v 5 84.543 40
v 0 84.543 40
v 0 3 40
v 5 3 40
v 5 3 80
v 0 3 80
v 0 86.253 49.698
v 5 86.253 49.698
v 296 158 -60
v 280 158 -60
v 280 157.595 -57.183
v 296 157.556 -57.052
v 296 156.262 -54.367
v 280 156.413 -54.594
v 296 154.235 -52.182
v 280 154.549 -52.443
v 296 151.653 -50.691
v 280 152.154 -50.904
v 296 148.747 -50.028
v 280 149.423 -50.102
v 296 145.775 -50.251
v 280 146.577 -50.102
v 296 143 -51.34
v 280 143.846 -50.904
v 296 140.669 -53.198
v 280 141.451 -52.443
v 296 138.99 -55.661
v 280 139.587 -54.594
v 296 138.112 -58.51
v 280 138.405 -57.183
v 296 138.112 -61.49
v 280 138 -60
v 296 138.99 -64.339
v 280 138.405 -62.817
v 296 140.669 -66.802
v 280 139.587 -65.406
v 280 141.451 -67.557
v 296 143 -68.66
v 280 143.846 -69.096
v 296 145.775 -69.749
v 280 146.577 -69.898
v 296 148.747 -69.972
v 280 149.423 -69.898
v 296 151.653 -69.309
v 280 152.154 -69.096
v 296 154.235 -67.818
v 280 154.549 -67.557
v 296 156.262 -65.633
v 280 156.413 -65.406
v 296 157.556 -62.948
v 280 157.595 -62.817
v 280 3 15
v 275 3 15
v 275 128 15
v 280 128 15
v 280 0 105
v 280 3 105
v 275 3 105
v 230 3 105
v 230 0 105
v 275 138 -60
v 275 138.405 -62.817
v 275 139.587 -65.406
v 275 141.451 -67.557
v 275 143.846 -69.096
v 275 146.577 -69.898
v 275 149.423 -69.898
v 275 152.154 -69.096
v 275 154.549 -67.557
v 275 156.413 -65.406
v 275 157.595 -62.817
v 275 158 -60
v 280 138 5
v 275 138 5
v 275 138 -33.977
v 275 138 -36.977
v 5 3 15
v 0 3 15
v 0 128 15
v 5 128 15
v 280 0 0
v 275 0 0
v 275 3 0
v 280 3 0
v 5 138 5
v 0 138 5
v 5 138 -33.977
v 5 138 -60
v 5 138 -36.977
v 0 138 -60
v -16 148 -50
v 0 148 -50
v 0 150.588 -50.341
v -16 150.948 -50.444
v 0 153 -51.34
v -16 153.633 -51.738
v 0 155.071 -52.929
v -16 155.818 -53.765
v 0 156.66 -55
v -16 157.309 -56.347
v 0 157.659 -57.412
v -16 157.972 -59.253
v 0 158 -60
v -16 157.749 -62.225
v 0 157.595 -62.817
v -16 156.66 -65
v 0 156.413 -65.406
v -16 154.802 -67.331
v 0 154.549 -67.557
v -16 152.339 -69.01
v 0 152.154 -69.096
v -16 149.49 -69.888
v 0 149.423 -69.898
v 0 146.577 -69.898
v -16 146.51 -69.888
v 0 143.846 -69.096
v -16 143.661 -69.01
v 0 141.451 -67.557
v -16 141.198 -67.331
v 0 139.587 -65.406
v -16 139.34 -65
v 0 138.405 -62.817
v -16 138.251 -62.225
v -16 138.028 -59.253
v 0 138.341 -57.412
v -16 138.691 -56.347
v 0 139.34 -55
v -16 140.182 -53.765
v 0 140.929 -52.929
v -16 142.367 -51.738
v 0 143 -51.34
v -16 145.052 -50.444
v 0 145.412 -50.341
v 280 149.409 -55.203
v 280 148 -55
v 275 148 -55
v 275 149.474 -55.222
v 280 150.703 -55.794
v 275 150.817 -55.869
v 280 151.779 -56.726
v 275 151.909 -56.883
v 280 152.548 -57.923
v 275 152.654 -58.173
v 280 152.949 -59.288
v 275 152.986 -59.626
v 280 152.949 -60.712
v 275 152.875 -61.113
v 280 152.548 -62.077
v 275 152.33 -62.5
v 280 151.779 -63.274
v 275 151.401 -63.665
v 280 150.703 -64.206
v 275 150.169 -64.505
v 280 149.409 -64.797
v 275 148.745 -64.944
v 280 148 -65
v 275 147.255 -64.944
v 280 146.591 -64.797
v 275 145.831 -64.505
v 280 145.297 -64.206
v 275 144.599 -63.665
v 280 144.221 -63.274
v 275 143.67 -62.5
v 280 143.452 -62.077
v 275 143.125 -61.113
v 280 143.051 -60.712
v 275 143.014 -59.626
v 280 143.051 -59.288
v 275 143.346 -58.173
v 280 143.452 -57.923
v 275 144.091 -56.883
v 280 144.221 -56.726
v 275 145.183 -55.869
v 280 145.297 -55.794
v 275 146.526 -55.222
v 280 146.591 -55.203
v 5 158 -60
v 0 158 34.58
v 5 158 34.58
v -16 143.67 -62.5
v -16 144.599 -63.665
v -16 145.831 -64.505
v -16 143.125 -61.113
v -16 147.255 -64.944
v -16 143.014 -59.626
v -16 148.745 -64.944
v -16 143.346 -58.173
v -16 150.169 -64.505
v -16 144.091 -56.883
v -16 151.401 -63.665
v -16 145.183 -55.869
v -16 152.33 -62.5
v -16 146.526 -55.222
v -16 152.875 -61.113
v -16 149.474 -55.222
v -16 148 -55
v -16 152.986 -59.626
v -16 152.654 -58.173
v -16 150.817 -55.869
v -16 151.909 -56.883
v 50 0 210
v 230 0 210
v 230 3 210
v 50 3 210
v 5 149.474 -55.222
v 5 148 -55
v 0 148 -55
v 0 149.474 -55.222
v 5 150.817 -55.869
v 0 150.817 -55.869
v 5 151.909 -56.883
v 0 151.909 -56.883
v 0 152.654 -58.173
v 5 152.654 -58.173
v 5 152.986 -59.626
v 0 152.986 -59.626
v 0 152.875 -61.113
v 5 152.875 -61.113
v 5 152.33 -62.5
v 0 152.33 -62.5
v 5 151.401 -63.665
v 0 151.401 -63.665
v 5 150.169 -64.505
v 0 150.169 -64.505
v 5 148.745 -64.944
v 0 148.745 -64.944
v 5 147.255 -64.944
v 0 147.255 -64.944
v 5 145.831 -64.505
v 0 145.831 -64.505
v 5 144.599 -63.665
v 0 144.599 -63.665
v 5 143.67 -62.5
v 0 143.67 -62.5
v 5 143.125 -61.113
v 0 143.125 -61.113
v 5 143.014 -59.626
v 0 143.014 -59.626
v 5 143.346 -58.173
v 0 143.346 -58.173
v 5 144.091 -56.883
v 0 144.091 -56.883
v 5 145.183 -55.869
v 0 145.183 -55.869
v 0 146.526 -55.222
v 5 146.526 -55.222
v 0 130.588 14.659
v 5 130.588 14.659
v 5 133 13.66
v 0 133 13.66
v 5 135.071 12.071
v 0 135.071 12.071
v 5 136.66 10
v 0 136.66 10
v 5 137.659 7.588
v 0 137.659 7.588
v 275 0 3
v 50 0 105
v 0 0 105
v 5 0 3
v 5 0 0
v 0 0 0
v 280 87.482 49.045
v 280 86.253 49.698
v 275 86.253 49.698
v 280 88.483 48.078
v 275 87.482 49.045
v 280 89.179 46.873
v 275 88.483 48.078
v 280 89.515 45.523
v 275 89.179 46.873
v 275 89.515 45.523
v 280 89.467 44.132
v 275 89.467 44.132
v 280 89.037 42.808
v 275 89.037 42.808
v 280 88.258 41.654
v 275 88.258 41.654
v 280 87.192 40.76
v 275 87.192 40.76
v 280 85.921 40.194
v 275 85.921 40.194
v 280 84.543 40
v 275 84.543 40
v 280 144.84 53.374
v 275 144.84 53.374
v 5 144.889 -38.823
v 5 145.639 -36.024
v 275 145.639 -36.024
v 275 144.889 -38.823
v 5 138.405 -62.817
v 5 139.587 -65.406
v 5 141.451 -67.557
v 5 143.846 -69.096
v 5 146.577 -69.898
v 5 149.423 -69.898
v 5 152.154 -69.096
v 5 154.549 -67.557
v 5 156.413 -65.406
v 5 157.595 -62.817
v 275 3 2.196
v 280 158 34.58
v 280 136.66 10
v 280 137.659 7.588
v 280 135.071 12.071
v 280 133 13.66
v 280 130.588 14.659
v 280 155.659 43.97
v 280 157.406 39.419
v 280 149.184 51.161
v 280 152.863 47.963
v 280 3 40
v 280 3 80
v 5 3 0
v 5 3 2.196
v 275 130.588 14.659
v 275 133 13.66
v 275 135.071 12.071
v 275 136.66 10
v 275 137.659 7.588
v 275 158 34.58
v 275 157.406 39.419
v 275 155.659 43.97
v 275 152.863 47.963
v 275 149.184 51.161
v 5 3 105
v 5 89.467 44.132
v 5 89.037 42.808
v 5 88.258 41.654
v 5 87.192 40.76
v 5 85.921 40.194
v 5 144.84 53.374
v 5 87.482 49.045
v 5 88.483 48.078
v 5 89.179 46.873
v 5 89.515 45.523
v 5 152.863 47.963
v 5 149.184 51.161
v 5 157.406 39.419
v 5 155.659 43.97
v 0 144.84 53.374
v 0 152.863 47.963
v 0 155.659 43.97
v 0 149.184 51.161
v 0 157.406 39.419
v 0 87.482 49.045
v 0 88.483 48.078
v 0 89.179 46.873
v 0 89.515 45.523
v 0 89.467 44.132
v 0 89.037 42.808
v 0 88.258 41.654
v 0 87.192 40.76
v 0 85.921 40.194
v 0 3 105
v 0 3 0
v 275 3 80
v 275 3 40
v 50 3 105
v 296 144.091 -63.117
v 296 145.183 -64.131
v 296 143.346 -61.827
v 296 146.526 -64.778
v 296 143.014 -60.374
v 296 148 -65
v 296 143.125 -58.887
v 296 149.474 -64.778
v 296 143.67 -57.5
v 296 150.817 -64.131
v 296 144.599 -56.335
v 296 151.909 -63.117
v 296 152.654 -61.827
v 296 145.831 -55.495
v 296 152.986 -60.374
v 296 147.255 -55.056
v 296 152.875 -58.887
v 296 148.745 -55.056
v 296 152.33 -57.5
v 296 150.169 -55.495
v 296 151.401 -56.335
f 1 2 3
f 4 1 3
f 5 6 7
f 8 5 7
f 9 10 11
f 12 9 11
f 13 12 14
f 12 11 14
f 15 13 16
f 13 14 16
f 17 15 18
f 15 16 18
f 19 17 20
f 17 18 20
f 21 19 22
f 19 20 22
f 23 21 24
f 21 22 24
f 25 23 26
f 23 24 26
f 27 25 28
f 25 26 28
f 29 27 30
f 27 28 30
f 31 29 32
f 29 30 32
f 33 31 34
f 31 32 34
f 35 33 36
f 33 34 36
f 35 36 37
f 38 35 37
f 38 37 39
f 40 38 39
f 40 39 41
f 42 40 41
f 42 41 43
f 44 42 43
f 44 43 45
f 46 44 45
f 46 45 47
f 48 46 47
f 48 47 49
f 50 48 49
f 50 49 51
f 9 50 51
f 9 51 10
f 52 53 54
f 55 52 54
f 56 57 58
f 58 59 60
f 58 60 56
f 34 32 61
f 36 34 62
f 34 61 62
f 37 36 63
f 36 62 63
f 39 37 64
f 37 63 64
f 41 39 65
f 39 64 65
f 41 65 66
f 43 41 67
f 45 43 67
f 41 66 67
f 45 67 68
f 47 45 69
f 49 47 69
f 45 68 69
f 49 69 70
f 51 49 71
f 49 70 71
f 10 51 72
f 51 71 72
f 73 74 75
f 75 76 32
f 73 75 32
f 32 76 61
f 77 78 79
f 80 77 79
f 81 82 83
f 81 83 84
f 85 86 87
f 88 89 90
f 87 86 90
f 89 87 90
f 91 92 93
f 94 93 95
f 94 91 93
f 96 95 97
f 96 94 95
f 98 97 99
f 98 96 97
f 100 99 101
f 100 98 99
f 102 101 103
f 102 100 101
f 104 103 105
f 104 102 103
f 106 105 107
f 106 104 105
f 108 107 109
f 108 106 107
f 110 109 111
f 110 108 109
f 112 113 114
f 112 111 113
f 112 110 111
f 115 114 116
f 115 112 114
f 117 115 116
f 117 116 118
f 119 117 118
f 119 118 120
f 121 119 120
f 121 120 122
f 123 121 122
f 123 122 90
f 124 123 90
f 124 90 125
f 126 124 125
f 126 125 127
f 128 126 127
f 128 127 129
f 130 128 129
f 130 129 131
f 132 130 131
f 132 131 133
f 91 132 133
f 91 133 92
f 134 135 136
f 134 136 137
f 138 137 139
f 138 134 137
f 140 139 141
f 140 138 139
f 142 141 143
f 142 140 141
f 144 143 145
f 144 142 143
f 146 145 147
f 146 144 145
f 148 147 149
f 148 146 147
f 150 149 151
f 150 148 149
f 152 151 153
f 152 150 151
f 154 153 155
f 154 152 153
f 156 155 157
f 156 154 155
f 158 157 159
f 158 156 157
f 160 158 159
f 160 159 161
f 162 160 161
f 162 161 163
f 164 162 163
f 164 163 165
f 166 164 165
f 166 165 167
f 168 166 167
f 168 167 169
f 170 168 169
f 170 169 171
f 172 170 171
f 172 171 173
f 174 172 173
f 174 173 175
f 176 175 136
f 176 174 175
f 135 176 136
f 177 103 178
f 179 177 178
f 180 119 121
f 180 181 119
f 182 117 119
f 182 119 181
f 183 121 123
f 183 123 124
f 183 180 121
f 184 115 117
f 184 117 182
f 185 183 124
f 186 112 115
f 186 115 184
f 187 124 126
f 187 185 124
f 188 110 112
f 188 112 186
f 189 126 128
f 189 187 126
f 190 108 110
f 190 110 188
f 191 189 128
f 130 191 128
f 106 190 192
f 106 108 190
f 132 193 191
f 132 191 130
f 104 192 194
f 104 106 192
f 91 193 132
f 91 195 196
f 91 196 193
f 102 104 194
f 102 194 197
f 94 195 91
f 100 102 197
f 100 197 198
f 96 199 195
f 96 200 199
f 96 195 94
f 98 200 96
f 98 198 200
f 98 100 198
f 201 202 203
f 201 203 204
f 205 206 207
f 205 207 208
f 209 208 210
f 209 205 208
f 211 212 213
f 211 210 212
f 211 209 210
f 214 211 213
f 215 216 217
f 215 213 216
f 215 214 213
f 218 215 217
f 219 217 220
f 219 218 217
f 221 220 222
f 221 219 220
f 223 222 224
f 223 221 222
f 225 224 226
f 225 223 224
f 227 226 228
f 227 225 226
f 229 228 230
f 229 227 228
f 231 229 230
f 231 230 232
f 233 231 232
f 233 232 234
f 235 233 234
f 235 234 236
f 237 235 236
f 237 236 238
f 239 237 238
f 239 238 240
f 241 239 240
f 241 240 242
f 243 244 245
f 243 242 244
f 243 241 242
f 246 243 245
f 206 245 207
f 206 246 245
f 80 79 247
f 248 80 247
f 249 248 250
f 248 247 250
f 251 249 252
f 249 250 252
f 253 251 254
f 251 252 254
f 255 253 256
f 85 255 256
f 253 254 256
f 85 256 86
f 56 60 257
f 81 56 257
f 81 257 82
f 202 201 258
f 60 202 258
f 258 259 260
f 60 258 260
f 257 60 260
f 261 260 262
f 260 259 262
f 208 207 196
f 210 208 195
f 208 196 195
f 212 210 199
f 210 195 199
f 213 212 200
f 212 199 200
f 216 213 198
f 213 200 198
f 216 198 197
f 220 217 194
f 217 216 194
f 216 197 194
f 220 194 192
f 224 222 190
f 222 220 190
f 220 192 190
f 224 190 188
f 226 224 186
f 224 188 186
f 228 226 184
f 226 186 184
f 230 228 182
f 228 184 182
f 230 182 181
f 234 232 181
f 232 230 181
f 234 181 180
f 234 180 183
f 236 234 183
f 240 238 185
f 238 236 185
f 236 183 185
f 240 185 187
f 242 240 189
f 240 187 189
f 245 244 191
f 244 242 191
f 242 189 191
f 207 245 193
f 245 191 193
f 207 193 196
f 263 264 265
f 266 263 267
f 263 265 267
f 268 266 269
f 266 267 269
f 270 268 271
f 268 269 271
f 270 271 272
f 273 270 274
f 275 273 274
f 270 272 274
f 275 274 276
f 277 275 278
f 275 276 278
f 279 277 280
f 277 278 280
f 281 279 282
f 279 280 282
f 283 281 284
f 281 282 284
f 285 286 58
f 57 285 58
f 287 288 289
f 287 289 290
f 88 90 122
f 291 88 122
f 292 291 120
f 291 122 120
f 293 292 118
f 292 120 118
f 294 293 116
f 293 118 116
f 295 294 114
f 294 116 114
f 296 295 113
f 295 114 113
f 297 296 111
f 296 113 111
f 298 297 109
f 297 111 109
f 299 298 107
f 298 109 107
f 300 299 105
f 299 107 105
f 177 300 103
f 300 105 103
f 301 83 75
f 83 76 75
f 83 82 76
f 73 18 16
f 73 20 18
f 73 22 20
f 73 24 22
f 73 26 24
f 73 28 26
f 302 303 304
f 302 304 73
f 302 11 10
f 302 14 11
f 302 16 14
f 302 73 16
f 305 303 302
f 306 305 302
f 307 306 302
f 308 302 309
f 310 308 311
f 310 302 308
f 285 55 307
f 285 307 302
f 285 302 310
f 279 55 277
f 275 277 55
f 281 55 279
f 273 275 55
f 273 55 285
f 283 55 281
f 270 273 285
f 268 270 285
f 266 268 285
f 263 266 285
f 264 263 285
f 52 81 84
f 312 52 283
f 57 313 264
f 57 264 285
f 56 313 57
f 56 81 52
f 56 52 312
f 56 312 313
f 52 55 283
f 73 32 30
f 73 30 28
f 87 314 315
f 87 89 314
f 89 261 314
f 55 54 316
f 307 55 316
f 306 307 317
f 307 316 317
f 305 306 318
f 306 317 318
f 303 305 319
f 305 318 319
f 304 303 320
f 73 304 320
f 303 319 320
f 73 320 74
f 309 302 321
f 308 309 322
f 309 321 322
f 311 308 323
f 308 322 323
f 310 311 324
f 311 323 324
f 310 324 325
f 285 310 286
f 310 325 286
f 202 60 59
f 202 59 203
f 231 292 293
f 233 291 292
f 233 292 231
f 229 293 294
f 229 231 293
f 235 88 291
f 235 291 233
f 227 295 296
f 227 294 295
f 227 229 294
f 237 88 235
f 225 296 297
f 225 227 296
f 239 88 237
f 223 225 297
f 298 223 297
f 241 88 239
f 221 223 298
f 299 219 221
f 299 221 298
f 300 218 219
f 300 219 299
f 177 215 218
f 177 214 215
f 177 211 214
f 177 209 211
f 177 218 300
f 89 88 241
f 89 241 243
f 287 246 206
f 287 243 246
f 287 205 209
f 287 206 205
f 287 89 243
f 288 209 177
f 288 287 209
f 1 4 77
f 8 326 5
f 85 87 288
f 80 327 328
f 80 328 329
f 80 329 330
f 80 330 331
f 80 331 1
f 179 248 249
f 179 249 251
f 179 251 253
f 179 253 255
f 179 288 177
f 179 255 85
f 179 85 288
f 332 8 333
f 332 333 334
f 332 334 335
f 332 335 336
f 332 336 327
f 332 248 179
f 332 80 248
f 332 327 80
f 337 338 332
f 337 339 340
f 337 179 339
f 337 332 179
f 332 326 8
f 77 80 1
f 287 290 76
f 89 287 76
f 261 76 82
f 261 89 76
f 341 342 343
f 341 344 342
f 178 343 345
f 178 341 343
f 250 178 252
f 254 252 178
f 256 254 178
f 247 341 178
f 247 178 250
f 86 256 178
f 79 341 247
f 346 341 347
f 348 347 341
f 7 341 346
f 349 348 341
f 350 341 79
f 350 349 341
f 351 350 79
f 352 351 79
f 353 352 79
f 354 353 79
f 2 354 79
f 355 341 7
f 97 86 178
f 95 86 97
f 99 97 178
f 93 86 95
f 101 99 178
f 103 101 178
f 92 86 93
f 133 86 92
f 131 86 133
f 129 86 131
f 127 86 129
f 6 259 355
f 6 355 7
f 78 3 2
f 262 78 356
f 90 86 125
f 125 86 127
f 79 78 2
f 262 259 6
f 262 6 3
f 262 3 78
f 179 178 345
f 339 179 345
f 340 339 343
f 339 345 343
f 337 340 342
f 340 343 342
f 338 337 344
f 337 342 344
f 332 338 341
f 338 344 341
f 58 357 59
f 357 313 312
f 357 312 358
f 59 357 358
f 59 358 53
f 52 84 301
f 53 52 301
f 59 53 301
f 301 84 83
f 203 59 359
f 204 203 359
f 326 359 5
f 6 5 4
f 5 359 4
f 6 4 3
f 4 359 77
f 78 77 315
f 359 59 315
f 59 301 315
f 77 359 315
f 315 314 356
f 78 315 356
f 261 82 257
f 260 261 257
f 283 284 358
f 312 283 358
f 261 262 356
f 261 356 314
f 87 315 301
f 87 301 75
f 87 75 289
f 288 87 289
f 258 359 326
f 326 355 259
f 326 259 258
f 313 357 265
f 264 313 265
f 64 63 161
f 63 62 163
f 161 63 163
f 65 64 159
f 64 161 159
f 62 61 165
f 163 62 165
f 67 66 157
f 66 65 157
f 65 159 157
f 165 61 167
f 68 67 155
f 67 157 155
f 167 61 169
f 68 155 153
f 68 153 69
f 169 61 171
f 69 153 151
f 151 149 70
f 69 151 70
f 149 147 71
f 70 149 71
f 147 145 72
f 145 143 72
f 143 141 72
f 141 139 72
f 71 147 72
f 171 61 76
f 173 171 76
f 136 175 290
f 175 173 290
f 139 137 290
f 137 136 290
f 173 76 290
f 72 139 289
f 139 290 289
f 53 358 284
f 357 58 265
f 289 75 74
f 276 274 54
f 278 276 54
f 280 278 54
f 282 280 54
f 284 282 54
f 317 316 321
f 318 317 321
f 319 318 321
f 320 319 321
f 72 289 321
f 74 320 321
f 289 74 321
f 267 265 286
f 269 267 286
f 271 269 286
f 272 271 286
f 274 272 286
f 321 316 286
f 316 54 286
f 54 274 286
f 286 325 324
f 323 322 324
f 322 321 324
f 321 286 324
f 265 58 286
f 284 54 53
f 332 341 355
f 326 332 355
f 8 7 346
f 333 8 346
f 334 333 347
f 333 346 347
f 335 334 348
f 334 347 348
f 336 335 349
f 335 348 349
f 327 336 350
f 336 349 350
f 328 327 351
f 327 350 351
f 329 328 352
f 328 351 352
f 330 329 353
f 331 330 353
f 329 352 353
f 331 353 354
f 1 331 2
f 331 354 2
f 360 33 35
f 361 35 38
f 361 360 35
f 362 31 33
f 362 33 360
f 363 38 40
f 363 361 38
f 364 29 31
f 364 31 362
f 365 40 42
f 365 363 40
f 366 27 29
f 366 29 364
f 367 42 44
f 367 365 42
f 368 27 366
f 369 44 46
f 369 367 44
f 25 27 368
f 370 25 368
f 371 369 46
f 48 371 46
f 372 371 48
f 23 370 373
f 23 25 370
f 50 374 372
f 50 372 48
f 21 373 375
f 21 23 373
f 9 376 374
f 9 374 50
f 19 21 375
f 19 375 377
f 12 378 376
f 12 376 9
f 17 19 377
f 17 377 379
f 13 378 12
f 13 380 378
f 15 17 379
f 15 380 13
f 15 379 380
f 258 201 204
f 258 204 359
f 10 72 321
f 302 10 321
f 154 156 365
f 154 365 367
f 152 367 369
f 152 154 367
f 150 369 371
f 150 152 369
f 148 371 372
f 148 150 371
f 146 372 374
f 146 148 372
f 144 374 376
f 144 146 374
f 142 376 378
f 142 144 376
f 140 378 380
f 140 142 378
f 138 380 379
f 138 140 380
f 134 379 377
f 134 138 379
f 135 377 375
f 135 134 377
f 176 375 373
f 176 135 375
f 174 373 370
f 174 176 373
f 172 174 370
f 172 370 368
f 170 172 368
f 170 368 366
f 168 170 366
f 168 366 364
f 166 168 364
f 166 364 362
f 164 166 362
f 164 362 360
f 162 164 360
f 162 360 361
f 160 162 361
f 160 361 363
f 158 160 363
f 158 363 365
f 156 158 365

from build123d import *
from build123d.topology import SkipClean

# Parameters (mm, degrees)
BOSS_EXTRUDE1_DEPTH     = 3
BOSS_EXTRUDE2_DEPTH     = 280
CUT_EXTRUDE2_DEPTH      = 385.010416525
CUT_EXTRUDE2_DEPTH_BACK = 385.010416525
SKETCH3_W               = 270
SKETCH3_H               = 200
CUT_EXTRUDE3_DEPTH      = 385.010416525
CUT_EXTRUDE3_DEPTH_BACK = 385.010416525
SKETCH4_R               = 5
BOSS_EXTRUDE3_START     = 16
SKETCH5_R               = 10
SKETCH5_R_2             = 5
BOSS_EXTRUDE3_DEPTH     = 16
SKETCH6_R               = 10
SKETCH6_R_2             = 5
BOSS_EXTRUDE4_DEPTH     = 16
BOSS_EXTRUDE5_DEPTH     = 270


with BuildPart() as part:
    # Sketch1 → Boss-Extrude1 (new body)
    with BuildSketch(Plane(origin=(0, 0, 0), x_dir=(1, 0, 0), z_dir=(0, 1, 0))):
        Polygon((0, 0), (280, 0), (280, -100), (230, -100), (230, -210), (50, -210), (50, -100), (0, -100), align=None)
    extrude(amount=BOSS_EXTRUDE1_DEPTH)

    # Sketch2 → Boss-Extrude2 (add, through all)
    with BuildSketch(Plane.ZY):
        with BuildLine():
            Line((15, 0), (15, 3))
            Line((15, 3), (15, 128))
            ThreePointArc((15, 128), (12.071067812, 135.071067812), (5, 138))
            Line((5, 138), (-60, 138))
            ThreePointArc((-60, 138), (-70, 148), (-60, 158))
            Line((-60, 158), (34.580462925, 158))
            ThreePointArc((34.580462925, 158), (46.051991652, 154.383040886), (53.37431534, 144.840402867))
            Line((53.37431534, 144.840402867), (105, 3))
            Line((105, 3), (105, 0))
            Line((105, 0), (80, 0))
            Line((80, 0), (80, 3))
            Line((80, 3), (49.698463104, 86.252788397))
            ThreePointArc((49.698463104, 86.252788397), (44.131759112, 89.466726445), (40, 84.54268768))
            Line((40, 84.54268768), (40, 3))
            Line((40, 3), (40, 0))
            Line((40, 0), (15, 0))
        make_face()
    extrude(amount=-BOSS_EXTRUDE2_DEPTH)

    # Sketch3 → Cut-Extrude2 (cut, two sides: drawn at the far end of the back side and taken through both)
    with BuildSketch(Plane(origin=(0, 0, 0), x_dir=(-1, 0, 0), z_dir=(0, 0, -1)).offset(-CUT_EXTRUDE2_DEPTH_BACK)):
        with Locations((-140, 103)):
            Rectangle(SKETCH3_W, SKETCH3_H)
    extrude(amount=CUT_EXTRUDE2_DEPTH + CUT_EXTRUDE2_DEPTH_BACK, mode=Mode.SUBTRACT)

    # Sketch4 → Cut-Extrude3 (cut, two sides: drawn at the far end of the back side and taken through both)
    with BuildSketch(Plane.ZY.offset(-CUT_EXTRUDE3_DEPTH_BACK)):
        with Locations((-60, 148)):
            Circle(SKETCH4_R)
    extrude(amount=CUT_EXTRUDE3_DEPTH + CUT_EXTRUDE3_DEPTH_BACK, mode=Mode.SUBTRACT)

    # Sketch5 → Boss-Extrude3 (add)
    with SkipClean():  # the faces are left unmerged after this step: merging them gives an invalid solid
        with BuildSketch(Plane.ZY.offset(BOSS_EXTRUDE3_START)):
            with Locations((-60, 148)):
                Circle(SKETCH5_R)
            with Locations((-60, 148)):
                Circle(SKETCH5_R_2, mode=Mode.SUBTRACT)
        extrude(amount=-BOSS_EXTRUDE3_DEPTH)

    # Sketch6 → Boss-Extrude4 (add)
    with SkipClean():  # the faces are left unmerged after this step: merging them gives an invalid solid
        with BuildSketch(Plane(origin=(280, 0, 0), x_dir=(0, 0, -1), z_dir=(1, 0, 0))):
            with Locations(Location((60, 148, 0), (0, 0, 90))):
                Circle(SKETCH6_R)
            with Locations((60, 148)):
                Circle(SKETCH6_R_2, mode=Mode.SUBTRACT)
        extrude(amount=BOSS_EXTRUDE4_DEPTH)

    # Sketch7 → Boss-Extrude5 (add)
    with SkipClean():  # the faces are left unmerged after this step: merging them gives an invalid solid
        with BuildSketch(Plane(origin=(5, 0, 0), x_dir=(0, 0, -1), z_dir=(1, 0, 0))):
            Polygon((0, 0), (-3, 0), (36.02381866, 145.638873943), (38.822856765, 144.888873943), align=None)
        extrude(amount=BOSS_EXTRUDE5_DEPTH)


solid = part.part
